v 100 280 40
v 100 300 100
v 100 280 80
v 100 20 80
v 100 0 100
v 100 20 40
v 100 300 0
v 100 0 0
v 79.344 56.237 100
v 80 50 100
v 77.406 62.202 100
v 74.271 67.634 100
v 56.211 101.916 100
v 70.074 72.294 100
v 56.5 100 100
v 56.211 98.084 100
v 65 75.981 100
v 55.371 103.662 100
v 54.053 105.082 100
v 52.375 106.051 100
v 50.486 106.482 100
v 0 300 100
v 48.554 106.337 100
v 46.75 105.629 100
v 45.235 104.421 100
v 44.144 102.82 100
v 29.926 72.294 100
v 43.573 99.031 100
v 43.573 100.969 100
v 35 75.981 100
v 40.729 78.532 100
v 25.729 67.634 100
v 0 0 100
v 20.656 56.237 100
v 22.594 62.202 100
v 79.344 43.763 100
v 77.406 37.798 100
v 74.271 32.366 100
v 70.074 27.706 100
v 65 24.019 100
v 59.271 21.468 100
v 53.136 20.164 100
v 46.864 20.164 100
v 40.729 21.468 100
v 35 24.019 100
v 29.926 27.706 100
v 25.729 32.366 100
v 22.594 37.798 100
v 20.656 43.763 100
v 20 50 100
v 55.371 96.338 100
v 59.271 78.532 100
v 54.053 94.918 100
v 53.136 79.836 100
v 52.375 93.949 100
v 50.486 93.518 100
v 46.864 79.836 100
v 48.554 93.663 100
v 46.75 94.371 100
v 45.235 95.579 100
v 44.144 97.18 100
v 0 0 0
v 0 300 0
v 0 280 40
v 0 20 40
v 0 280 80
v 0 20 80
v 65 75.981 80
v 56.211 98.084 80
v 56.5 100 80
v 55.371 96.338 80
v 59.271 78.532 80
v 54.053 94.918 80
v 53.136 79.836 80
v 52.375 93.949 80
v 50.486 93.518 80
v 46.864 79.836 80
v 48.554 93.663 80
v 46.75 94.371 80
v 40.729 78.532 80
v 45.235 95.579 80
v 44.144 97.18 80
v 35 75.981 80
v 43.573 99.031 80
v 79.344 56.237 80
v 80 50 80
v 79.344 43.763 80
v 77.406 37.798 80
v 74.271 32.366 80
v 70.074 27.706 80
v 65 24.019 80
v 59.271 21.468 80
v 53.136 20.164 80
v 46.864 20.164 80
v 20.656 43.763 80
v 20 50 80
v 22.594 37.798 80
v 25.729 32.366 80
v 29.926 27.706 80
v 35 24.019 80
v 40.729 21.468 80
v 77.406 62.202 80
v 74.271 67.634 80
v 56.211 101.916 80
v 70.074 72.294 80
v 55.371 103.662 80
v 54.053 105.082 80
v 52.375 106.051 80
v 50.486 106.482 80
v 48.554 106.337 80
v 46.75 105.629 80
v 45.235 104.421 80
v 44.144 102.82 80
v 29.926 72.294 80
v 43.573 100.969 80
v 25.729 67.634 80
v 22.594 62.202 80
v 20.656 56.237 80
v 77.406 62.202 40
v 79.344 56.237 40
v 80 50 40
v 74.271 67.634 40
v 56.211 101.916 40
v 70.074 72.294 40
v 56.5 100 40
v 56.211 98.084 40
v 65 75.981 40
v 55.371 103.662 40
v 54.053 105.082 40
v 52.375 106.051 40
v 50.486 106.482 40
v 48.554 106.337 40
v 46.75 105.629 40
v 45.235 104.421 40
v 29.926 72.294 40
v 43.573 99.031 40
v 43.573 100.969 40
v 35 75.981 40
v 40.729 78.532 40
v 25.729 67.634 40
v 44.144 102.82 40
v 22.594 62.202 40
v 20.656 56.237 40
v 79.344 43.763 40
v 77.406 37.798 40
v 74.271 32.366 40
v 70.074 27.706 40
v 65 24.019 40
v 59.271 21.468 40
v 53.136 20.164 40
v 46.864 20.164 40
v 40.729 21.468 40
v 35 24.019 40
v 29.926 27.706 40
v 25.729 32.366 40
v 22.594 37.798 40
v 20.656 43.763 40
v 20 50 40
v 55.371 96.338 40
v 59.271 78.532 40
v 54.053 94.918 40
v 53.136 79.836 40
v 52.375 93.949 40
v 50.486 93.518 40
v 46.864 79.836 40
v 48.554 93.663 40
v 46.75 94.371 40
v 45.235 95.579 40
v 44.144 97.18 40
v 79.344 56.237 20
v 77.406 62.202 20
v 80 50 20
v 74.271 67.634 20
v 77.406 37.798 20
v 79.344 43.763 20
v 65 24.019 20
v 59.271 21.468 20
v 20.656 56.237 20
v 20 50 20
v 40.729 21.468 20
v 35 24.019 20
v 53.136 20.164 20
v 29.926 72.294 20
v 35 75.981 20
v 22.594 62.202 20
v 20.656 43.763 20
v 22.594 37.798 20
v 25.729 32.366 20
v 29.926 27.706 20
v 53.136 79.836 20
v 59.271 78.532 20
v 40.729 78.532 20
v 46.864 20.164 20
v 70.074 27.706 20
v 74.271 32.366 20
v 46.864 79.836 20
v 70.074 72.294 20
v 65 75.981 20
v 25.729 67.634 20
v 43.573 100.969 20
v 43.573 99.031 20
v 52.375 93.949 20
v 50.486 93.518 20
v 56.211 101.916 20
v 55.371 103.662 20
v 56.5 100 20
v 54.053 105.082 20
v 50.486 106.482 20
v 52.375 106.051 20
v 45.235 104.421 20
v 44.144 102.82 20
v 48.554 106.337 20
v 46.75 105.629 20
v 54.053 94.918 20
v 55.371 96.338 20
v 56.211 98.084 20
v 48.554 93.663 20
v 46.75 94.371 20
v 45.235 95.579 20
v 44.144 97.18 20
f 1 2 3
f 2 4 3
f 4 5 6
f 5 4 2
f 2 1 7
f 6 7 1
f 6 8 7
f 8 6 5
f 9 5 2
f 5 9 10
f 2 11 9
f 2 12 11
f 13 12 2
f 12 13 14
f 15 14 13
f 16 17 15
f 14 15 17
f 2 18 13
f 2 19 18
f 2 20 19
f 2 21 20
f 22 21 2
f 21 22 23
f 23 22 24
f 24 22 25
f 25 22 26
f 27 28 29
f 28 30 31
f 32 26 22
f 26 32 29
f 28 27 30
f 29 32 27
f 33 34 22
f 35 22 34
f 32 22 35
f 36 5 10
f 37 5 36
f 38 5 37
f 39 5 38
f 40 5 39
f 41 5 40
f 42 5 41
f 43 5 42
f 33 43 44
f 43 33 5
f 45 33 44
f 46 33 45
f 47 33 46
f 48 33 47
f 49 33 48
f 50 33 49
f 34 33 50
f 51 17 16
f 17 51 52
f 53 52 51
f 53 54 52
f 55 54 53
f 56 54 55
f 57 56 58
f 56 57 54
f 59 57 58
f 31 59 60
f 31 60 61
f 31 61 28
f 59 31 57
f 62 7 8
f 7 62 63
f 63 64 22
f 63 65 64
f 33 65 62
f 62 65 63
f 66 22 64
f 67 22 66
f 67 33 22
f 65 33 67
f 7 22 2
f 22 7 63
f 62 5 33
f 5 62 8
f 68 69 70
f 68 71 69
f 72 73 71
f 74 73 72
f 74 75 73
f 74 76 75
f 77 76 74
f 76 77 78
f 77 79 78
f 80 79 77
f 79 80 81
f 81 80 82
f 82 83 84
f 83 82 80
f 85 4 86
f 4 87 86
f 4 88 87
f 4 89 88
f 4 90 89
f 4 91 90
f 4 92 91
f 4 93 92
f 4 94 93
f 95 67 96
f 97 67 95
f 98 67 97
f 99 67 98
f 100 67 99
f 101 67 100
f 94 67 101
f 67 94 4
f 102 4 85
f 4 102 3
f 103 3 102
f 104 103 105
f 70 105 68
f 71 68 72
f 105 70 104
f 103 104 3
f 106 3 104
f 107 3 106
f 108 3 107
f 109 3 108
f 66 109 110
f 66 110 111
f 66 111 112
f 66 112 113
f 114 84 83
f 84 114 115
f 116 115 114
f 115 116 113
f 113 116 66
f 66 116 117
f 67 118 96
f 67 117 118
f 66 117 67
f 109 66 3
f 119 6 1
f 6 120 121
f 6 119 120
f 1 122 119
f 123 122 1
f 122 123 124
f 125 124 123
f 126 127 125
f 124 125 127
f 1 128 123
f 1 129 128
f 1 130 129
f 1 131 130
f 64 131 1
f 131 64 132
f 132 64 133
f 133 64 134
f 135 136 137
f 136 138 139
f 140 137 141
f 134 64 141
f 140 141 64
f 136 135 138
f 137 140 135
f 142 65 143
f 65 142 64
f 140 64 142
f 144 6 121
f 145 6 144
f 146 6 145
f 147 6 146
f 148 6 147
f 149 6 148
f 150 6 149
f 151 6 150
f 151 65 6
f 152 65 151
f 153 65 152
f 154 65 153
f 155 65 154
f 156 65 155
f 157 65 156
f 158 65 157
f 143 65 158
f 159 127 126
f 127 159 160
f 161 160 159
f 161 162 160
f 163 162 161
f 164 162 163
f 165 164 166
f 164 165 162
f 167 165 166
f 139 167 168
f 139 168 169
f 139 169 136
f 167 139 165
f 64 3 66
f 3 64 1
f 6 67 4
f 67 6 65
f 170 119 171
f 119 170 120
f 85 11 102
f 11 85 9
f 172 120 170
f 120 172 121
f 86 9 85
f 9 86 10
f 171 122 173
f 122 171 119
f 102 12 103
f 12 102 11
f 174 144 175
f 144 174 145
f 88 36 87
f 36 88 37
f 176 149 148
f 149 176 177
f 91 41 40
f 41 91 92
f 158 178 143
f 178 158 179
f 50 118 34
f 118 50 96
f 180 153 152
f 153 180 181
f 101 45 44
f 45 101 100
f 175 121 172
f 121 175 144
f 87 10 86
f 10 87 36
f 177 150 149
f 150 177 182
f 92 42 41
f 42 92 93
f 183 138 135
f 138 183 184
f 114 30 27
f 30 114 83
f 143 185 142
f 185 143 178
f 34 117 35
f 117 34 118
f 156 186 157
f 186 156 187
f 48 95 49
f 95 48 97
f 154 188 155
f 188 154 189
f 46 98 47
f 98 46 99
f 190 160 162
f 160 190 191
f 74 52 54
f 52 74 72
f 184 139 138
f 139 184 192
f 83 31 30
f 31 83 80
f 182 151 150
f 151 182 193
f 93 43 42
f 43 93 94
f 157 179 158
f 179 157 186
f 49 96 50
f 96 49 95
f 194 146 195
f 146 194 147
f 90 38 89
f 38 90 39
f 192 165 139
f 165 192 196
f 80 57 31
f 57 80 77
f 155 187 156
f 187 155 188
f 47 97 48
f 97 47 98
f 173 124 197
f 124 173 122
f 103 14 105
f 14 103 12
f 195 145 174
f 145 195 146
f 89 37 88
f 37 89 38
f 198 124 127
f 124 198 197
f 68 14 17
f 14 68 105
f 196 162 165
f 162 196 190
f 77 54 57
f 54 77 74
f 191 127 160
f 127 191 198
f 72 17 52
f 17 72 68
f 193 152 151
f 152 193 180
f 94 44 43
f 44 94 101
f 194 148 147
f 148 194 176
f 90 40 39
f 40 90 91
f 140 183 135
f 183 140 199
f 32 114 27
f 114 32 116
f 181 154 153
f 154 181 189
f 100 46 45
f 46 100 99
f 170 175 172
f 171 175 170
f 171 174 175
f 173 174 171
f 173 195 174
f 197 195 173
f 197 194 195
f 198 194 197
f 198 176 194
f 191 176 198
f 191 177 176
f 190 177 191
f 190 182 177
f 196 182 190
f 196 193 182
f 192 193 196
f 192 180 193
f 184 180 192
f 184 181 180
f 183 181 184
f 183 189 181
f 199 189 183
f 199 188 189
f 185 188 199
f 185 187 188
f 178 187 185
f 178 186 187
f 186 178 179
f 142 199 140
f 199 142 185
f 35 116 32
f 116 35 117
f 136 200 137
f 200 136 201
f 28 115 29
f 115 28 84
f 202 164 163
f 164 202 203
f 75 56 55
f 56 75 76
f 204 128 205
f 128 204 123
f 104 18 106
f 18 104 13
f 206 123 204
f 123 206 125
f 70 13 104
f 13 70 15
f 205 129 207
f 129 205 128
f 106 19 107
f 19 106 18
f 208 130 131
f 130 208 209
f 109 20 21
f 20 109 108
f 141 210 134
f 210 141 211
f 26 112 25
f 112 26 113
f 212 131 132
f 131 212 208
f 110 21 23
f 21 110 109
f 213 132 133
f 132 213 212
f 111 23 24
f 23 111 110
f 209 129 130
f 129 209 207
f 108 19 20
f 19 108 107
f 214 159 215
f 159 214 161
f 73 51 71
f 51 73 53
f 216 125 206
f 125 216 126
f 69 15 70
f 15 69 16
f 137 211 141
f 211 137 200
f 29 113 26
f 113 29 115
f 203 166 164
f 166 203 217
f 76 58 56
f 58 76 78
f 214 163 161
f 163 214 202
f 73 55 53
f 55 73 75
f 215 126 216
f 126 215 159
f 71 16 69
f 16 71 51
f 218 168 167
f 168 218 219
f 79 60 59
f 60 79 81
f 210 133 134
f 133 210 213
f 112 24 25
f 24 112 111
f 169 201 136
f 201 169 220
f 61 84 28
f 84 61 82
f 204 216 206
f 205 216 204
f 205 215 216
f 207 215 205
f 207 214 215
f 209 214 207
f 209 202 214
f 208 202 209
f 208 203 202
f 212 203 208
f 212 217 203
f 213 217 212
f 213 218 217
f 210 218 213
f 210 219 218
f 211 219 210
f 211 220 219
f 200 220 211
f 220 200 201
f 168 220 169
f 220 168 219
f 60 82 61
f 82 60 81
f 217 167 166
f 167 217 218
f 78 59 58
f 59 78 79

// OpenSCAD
////////////////////
//                //
//  Measurements  //
//                //
////////////////////

// Notes:
// - Measurements are taken from a frontal perspective, while
//   subject is standing

// Sophie's Electric Toothbrush
// - the base of the toothbrush is an unusual oval shape and
//   narrows towards the top
tb1_depth = 32;
tb1_width = 28;
tb1_height = 170;

// Adin/Sophie's Non-Electric Toothbrushes
tb2_depth = 10;
tb2_width = 13;
tb2_height = 180;

// Sophie's Toothpaste
tp1_depth = -1;
tp1_width = -1;
tp1_height = 150;

// Adin's Toothpaste
tp2_bottom_depth = 20;
tp2_bottom_width = 60;
tp2_top_depth = 38;
tp2_top_width = 40;
tp2_height = 200;

/////////////
//         //
//  Model  //
//         //
/////////////

base_depth = 300;
base_width = 100;
base_height = 100;

module base() {
    difference() {
        cube([base_width, base_depth, base_height]);
        translate([
            0,
            20,
            40
        ]) cube([base_width, base_depth - 40, base_height - 60]);
    }
}

module toothbrush(depth, width, height) {
    diameter = max(depth, width);
    cylinder(height, d=diameter);
}

module toothpaste(bottom_depth, bottom_width, top_depth, top_width, height) {
    diameter = max(bottom_depth, bottom_width, top_depth, top_width);
    cylinder(height, d=diameter);
}

module tb1() {
    toothbrush(tb1_depth, tb1_width, tb1_height);
}

module tb2() {
    toothbrush(tb2_depth, tb2_width, tb2_height);
}

module tp1() {
    assert(false, "Not Implemented");
};

module tp2() {
    toothpaste(tp2_bottom_depth, tp2_bottom_width, tp2_top_depth, tp2_top_width, tp2_height);
}

////////////
//        //
//  Main  //
//        //
////////////

module main() {
    difference() {
        base();
        translate([
            base_width / 2,
            50,
            20
        ]) tp2();
        translate([
            base_width / 2,
            100,
            20
        ]) tb2();
        
    }
}

main();
